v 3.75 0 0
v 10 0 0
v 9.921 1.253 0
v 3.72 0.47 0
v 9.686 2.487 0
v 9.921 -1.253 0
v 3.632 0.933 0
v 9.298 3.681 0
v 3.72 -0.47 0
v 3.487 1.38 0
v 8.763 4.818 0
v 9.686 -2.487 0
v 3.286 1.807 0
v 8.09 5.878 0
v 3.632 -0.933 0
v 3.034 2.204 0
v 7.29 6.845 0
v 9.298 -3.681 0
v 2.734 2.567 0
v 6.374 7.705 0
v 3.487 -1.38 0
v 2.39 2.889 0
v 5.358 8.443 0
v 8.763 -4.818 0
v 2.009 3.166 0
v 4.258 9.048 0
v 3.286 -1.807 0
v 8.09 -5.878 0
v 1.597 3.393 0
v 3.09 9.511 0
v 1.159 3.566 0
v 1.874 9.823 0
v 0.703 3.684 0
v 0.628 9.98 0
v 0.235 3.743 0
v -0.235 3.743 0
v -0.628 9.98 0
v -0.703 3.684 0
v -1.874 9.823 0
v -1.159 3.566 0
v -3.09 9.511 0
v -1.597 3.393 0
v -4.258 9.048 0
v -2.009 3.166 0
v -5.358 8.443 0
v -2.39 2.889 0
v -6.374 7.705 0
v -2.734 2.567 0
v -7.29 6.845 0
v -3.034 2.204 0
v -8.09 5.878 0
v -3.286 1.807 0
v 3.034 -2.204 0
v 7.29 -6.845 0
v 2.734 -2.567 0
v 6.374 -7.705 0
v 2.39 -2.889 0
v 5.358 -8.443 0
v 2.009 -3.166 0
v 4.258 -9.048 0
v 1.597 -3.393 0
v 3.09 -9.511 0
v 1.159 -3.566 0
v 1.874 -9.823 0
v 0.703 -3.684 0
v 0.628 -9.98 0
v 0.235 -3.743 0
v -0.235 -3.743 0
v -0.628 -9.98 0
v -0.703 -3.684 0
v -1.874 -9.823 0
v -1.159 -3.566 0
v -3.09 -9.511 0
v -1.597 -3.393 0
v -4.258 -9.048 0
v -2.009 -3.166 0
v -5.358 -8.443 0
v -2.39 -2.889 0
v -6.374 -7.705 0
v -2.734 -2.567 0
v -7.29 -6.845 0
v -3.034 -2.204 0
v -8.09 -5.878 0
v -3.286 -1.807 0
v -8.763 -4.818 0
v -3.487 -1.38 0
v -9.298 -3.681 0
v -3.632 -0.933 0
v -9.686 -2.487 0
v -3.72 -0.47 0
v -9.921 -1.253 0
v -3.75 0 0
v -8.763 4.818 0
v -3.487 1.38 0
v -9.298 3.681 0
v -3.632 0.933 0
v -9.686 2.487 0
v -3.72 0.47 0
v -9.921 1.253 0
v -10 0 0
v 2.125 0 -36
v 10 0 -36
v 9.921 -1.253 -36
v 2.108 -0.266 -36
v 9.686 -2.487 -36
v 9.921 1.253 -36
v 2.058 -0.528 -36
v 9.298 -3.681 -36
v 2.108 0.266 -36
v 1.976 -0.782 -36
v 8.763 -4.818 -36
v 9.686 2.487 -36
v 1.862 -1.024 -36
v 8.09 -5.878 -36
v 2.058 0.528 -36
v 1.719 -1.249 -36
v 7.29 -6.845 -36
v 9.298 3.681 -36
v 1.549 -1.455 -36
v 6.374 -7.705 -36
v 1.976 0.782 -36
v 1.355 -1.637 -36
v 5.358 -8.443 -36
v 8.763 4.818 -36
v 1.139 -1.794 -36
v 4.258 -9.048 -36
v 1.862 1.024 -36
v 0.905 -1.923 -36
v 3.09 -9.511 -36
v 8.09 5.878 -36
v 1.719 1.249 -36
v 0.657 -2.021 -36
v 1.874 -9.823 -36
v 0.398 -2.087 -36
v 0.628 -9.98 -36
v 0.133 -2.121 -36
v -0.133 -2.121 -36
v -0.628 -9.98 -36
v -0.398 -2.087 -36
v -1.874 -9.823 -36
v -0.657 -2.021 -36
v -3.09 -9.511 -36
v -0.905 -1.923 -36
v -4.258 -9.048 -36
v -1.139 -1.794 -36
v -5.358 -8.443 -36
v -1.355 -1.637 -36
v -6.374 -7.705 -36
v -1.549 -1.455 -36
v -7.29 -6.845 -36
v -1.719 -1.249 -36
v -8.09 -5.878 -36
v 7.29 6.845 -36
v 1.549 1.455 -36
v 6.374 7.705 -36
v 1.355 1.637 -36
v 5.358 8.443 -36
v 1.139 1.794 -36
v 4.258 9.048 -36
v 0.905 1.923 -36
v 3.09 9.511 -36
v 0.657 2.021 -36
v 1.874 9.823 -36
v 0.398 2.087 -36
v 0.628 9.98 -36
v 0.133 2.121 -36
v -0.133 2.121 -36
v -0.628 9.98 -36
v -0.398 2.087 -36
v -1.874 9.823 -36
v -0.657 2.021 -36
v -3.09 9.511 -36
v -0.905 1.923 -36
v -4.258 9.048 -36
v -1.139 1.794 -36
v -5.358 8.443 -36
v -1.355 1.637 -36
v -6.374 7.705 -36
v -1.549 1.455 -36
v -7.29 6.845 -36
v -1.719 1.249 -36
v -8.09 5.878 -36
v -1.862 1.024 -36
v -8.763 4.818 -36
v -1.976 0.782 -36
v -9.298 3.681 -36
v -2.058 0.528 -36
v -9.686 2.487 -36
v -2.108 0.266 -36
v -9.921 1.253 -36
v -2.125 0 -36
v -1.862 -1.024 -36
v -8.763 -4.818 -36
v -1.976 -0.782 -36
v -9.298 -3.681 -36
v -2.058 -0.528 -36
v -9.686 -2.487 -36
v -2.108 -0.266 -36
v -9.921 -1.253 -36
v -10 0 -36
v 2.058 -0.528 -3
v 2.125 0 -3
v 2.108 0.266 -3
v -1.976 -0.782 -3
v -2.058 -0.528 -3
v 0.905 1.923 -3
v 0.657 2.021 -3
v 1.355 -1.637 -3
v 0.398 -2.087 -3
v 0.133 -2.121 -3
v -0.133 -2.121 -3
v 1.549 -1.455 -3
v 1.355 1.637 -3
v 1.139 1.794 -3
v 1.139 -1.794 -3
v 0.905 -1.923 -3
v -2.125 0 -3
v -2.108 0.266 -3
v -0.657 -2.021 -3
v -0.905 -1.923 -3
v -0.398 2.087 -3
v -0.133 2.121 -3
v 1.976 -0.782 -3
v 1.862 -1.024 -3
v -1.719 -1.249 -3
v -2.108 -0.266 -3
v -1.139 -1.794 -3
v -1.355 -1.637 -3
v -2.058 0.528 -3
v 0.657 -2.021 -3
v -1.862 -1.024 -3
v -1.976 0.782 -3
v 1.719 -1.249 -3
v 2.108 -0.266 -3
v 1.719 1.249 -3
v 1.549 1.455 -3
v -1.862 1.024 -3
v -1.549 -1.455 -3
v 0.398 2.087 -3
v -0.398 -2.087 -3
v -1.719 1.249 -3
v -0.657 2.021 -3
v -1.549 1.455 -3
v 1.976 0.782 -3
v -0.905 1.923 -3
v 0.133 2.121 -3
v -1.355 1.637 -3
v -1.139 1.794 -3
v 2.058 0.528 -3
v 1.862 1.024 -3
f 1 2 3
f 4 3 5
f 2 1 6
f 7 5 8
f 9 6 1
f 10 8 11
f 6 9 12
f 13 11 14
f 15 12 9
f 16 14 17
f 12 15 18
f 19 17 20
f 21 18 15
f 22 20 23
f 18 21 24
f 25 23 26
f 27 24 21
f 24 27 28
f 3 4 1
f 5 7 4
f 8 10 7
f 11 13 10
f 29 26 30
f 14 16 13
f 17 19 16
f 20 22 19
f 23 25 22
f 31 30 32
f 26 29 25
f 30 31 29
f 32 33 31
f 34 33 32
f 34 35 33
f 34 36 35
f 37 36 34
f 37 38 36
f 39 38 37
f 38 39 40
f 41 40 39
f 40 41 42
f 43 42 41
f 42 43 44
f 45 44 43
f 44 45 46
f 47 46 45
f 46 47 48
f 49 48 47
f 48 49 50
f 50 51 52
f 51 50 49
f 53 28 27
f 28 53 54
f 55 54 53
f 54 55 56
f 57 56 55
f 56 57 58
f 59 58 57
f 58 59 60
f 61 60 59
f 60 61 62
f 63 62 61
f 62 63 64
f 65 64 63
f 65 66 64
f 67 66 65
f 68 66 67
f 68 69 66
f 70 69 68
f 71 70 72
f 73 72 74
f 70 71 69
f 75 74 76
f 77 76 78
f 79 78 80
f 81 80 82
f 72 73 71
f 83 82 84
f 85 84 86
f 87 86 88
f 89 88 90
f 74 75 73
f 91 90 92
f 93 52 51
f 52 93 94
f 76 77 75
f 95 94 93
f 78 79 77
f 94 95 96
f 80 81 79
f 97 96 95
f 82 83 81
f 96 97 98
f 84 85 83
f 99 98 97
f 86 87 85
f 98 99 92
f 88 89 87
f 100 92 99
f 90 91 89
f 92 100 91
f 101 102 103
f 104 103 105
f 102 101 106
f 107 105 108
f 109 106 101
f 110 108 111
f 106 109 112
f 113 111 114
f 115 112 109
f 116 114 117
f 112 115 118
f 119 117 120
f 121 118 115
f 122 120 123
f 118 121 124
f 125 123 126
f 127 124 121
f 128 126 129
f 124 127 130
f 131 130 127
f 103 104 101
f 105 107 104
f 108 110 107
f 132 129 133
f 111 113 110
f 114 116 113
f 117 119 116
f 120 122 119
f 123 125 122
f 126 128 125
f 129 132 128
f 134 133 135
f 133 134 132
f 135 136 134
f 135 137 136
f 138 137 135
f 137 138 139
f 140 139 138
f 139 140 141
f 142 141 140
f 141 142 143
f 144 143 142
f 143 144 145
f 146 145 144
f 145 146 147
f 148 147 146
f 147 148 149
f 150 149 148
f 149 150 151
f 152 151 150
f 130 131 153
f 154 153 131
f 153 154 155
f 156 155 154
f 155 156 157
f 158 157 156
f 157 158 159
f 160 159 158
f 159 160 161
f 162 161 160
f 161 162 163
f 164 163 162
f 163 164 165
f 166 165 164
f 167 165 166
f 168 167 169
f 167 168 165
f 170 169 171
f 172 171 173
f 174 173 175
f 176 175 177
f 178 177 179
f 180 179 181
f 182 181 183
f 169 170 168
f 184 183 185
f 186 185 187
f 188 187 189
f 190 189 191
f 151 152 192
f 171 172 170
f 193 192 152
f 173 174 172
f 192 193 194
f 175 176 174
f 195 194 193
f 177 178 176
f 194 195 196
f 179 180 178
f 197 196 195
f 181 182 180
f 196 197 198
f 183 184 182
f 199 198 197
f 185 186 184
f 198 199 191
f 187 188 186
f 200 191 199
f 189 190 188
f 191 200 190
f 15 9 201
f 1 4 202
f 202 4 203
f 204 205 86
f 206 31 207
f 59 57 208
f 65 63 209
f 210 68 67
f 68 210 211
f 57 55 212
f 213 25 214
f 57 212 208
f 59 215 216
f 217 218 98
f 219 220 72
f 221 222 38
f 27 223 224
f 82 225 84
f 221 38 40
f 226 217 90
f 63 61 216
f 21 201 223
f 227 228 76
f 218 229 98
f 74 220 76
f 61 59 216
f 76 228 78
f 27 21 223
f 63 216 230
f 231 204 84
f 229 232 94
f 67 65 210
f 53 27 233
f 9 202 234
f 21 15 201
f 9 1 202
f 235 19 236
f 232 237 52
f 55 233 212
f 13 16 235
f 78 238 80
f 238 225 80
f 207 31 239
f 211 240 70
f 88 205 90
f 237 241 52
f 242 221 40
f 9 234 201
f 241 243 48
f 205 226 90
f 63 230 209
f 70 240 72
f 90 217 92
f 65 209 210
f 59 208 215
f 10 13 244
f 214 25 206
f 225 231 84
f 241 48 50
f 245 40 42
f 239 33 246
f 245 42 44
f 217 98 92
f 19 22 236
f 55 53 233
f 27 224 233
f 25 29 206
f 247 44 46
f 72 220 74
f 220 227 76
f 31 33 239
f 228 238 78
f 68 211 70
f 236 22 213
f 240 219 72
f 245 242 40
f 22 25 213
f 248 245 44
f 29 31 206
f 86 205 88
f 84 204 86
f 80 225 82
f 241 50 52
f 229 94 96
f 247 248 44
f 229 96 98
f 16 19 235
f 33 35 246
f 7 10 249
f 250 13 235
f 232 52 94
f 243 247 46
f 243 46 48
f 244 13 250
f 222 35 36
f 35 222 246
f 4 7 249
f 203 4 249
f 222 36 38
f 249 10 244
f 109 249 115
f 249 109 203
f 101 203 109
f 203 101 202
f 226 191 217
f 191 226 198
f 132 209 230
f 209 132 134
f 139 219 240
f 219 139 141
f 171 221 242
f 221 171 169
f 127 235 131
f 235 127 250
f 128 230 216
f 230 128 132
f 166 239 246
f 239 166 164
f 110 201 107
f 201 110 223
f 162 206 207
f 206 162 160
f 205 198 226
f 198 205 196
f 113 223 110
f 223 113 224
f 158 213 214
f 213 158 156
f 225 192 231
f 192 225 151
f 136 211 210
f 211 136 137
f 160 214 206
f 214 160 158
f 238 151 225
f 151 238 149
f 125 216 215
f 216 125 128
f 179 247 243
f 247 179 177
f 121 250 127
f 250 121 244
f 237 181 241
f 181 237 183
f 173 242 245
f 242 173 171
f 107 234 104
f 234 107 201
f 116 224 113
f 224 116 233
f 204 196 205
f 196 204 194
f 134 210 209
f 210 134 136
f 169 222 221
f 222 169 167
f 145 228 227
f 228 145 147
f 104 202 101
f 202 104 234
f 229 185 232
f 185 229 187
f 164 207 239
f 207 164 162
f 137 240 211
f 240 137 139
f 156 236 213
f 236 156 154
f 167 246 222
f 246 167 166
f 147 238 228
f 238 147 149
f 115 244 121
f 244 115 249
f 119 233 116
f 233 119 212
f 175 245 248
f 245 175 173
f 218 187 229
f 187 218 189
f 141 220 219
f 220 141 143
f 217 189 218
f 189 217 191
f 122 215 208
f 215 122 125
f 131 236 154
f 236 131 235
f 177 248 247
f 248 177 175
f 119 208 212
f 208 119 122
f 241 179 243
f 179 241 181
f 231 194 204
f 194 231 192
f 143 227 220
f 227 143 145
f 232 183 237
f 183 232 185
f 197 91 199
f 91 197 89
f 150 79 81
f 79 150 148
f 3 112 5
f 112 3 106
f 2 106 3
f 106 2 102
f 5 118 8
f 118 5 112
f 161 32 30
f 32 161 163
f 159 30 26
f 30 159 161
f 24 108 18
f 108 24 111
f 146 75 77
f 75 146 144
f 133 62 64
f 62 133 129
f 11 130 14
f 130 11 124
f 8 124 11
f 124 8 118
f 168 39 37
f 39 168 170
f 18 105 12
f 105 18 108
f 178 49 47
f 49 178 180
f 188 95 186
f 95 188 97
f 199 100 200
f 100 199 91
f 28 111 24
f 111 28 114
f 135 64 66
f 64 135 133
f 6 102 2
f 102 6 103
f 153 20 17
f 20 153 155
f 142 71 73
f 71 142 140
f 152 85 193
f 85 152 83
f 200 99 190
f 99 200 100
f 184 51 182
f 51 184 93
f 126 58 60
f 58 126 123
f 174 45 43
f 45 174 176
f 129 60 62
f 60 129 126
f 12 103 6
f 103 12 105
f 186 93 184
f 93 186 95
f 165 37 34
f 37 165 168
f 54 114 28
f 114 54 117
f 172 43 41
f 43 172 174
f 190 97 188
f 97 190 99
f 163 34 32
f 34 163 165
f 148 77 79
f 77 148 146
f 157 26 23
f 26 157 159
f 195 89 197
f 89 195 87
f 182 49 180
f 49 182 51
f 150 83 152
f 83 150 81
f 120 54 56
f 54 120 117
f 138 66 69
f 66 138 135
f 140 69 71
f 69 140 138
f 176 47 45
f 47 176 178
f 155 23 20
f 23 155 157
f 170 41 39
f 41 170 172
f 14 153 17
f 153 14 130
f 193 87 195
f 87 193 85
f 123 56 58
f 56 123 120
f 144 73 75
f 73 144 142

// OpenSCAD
$fn = 50;


difference() {
	union() {
		translate(v = [0, 0, -36.0000000000]) {
			cylinder(h = 36, r = 10.0000000000);
		}
		cylinder(h = 0, r = 13.0000000000);
	}
	union() {
		translate(v = [0, 0, 0]) {
			rotate(a = [0, 0, 0]) {
				difference() {
					union() {
						#translate(v = [0, 0, -36.0000000000]) {
							cylinder(h = 36, r = 2.0000000000);
						}
						#translate(v = [0, 0, -3]) {
							cylinder(h = 3, r1 = 2.1250000000, r2 = 3.7500000000);
						}
						#translate(v = [0, 0, -36.0000000000]) {
							cylinder(h = 36, r = 2.1250000000);
						}
						#translate(v = [0, 0, -36.0000000000]) {
							cylinder(h = 36, r = 2.0000000000);
						}
					}
					union();
				}
			}
		}
	}
}
